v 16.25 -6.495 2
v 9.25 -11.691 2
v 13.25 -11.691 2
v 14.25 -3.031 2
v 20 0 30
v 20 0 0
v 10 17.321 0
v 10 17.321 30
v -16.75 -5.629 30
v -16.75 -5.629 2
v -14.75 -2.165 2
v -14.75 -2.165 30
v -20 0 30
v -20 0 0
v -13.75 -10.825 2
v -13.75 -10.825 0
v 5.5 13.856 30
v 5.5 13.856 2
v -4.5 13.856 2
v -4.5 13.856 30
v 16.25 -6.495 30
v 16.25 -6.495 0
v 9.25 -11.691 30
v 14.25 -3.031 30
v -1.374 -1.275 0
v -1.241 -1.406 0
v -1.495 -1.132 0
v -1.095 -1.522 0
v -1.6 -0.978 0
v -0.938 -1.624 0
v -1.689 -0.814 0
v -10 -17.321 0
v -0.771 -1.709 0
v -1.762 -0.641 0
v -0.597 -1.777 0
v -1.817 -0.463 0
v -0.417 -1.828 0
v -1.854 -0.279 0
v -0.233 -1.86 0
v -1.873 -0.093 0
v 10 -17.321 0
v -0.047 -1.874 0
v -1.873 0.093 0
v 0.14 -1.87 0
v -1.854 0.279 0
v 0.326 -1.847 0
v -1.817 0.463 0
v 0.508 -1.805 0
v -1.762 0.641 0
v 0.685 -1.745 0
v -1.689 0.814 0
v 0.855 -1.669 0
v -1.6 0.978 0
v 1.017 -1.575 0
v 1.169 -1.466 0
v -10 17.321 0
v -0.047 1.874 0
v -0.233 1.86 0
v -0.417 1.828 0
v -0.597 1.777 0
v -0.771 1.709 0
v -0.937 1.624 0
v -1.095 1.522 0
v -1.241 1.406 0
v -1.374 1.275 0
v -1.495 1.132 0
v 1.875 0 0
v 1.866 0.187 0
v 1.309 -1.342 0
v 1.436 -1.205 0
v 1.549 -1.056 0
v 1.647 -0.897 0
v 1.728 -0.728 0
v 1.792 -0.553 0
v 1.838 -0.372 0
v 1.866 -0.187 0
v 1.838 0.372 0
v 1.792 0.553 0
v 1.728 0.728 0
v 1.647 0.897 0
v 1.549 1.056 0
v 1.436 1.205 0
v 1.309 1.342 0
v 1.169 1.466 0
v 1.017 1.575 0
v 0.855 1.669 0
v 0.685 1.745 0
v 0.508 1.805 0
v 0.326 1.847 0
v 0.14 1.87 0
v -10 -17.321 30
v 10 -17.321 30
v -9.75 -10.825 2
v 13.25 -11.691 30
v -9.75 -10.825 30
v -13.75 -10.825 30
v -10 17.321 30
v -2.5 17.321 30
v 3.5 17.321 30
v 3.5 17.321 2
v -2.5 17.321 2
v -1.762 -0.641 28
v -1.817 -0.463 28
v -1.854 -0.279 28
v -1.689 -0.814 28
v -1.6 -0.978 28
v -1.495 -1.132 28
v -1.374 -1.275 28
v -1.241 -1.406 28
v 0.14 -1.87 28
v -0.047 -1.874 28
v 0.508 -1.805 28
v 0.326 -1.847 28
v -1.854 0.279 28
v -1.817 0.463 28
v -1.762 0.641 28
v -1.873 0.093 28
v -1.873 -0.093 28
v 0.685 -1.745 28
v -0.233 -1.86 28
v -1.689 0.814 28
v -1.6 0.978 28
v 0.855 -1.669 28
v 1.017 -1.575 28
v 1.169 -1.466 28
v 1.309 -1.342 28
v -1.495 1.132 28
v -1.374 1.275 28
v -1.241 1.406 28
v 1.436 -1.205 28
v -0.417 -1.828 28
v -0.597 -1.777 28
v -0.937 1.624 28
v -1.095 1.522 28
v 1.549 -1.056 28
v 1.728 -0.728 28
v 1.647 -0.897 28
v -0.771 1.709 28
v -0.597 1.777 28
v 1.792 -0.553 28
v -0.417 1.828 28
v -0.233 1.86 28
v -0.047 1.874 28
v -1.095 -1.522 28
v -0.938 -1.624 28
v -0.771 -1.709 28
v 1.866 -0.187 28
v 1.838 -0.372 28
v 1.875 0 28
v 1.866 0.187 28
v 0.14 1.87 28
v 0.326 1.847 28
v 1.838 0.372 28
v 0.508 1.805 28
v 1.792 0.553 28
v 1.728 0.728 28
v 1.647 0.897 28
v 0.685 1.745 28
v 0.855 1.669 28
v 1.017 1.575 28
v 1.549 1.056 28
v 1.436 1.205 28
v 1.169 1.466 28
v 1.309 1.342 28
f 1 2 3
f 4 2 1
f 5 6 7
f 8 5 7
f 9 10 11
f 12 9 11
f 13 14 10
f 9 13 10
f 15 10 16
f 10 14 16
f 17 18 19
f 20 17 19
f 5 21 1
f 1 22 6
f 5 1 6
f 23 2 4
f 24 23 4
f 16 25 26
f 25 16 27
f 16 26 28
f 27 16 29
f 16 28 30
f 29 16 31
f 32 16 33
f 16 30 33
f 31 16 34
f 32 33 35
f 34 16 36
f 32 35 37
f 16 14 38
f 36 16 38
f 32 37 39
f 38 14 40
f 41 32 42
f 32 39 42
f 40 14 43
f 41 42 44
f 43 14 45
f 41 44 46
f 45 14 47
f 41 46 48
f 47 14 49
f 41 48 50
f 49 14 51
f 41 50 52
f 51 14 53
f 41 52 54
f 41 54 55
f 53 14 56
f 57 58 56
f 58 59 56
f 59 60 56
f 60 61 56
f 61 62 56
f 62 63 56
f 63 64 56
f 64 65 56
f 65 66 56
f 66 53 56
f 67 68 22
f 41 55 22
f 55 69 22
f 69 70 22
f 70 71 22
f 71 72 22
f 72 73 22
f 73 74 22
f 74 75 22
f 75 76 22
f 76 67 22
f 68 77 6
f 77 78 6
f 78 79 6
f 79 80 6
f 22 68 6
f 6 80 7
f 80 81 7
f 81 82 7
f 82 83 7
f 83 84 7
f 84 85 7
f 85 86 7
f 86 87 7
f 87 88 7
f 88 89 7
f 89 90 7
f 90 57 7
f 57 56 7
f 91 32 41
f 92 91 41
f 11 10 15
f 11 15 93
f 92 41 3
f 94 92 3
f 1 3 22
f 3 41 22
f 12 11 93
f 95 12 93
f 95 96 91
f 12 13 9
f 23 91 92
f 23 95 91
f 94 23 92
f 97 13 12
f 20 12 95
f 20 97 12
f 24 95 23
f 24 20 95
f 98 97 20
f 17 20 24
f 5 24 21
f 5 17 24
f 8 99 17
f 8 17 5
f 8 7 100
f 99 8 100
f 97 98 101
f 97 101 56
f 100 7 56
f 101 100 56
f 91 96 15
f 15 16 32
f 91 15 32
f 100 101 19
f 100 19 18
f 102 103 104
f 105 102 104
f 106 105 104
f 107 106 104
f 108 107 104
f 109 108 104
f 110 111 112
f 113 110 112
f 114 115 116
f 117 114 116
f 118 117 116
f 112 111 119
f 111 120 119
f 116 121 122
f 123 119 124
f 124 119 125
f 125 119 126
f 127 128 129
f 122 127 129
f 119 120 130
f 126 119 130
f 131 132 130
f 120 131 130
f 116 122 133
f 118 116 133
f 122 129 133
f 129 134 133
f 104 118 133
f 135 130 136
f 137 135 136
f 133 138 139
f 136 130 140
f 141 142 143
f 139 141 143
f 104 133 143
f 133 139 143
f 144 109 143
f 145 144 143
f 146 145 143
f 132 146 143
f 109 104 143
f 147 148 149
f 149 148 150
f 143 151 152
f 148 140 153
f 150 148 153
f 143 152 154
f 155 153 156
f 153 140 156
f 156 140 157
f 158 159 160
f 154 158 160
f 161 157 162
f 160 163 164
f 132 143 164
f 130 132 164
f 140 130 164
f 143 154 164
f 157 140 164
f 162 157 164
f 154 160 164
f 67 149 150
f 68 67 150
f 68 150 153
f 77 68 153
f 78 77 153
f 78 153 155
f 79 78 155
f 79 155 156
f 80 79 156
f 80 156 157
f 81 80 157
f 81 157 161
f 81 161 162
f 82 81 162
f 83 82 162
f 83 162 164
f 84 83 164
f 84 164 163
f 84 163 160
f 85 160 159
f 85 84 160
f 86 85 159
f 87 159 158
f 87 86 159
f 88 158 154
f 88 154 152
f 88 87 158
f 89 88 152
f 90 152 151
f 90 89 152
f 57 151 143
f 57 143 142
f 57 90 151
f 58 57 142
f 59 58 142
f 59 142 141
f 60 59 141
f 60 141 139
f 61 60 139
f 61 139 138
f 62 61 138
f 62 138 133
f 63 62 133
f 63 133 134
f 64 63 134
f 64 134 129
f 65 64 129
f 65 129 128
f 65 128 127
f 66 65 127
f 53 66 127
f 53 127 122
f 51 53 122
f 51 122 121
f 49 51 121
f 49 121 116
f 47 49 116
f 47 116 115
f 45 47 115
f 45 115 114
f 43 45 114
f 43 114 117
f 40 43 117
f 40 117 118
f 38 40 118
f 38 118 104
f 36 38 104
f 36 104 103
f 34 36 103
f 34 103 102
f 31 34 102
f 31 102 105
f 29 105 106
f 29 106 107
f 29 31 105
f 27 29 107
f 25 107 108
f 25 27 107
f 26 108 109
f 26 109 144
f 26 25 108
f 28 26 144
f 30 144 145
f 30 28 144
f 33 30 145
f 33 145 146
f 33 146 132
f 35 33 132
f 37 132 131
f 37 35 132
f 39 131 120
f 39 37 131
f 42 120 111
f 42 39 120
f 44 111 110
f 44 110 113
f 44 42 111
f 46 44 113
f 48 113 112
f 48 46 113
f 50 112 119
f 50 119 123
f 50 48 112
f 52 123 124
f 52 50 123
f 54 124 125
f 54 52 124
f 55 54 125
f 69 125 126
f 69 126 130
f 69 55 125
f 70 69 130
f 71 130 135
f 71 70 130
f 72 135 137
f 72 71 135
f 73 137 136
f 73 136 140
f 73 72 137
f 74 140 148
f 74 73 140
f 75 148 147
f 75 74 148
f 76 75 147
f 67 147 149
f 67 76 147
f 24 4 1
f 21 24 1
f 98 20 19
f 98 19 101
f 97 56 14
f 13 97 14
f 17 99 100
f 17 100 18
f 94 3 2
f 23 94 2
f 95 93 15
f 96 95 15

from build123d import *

# Parameters (mm, degrees)
F0_R     = 1.875
F1_DEPTH = 30
F2_DEPTH = 2
F3_START = 28
F3_DEPTH = 2


with BuildPart() as f1:
    # F0 (on Top) → F1 (new body)
    with BuildSketch(Plane.XY):
        Polygon((-10, -17.3205080757), (10, -17.3205080757), (13.25, -11.6913429511), (9.25, -11.6913429511), (14.25, -3.0310889132), (16.25, -6.4951905284), (20, 0), (10, 17.3205080757), (3.5, 17.3205080757), (5.5, 13.8564064606), (-4.5, 13.8564064606), (-2.5, 17.3205080757), (-10, 17.3205080757), (-20, 0), (-16.75, -5.6291651246), (-14.75, -2.1650635095), (-9.75, -10.8253175473), (-13.75, -10.8253175473), align=None)
        Circle(F0_R, mode=Mode.SUBTRACT)
    extrude(amount=F1_DEPTH)

    # F0 (on Top) → F2 (join)
    with BuildSketch(Plane.XY):
        Polygon((-16.75, -5.6291651246), (-13.75, -10.8253175473), (-9.75, -10.8253175473), (-14.75, -2.1650635095), align=None)
        Polygon((9.25, -11.6913429511), (13.25, -11.6913429511), (16.25, -6.4951905284), (14.25, -3.0310889132), align=None)
        Polygon((5.5, 13.8564064606), (3.5, 17.3205080757), (-2.5, 17.3205080757), (-4.5, 13.8564064606), align=None)
    extrude(amount=F2_DEPTH)

    # F0 (on Top) → F3 (join)
    with BuildSketch(Plane.XY.offset(F3_START)):
        Circle(F0_R)
    extrude(amount=F3_DEPTH)


solid = f1.part
